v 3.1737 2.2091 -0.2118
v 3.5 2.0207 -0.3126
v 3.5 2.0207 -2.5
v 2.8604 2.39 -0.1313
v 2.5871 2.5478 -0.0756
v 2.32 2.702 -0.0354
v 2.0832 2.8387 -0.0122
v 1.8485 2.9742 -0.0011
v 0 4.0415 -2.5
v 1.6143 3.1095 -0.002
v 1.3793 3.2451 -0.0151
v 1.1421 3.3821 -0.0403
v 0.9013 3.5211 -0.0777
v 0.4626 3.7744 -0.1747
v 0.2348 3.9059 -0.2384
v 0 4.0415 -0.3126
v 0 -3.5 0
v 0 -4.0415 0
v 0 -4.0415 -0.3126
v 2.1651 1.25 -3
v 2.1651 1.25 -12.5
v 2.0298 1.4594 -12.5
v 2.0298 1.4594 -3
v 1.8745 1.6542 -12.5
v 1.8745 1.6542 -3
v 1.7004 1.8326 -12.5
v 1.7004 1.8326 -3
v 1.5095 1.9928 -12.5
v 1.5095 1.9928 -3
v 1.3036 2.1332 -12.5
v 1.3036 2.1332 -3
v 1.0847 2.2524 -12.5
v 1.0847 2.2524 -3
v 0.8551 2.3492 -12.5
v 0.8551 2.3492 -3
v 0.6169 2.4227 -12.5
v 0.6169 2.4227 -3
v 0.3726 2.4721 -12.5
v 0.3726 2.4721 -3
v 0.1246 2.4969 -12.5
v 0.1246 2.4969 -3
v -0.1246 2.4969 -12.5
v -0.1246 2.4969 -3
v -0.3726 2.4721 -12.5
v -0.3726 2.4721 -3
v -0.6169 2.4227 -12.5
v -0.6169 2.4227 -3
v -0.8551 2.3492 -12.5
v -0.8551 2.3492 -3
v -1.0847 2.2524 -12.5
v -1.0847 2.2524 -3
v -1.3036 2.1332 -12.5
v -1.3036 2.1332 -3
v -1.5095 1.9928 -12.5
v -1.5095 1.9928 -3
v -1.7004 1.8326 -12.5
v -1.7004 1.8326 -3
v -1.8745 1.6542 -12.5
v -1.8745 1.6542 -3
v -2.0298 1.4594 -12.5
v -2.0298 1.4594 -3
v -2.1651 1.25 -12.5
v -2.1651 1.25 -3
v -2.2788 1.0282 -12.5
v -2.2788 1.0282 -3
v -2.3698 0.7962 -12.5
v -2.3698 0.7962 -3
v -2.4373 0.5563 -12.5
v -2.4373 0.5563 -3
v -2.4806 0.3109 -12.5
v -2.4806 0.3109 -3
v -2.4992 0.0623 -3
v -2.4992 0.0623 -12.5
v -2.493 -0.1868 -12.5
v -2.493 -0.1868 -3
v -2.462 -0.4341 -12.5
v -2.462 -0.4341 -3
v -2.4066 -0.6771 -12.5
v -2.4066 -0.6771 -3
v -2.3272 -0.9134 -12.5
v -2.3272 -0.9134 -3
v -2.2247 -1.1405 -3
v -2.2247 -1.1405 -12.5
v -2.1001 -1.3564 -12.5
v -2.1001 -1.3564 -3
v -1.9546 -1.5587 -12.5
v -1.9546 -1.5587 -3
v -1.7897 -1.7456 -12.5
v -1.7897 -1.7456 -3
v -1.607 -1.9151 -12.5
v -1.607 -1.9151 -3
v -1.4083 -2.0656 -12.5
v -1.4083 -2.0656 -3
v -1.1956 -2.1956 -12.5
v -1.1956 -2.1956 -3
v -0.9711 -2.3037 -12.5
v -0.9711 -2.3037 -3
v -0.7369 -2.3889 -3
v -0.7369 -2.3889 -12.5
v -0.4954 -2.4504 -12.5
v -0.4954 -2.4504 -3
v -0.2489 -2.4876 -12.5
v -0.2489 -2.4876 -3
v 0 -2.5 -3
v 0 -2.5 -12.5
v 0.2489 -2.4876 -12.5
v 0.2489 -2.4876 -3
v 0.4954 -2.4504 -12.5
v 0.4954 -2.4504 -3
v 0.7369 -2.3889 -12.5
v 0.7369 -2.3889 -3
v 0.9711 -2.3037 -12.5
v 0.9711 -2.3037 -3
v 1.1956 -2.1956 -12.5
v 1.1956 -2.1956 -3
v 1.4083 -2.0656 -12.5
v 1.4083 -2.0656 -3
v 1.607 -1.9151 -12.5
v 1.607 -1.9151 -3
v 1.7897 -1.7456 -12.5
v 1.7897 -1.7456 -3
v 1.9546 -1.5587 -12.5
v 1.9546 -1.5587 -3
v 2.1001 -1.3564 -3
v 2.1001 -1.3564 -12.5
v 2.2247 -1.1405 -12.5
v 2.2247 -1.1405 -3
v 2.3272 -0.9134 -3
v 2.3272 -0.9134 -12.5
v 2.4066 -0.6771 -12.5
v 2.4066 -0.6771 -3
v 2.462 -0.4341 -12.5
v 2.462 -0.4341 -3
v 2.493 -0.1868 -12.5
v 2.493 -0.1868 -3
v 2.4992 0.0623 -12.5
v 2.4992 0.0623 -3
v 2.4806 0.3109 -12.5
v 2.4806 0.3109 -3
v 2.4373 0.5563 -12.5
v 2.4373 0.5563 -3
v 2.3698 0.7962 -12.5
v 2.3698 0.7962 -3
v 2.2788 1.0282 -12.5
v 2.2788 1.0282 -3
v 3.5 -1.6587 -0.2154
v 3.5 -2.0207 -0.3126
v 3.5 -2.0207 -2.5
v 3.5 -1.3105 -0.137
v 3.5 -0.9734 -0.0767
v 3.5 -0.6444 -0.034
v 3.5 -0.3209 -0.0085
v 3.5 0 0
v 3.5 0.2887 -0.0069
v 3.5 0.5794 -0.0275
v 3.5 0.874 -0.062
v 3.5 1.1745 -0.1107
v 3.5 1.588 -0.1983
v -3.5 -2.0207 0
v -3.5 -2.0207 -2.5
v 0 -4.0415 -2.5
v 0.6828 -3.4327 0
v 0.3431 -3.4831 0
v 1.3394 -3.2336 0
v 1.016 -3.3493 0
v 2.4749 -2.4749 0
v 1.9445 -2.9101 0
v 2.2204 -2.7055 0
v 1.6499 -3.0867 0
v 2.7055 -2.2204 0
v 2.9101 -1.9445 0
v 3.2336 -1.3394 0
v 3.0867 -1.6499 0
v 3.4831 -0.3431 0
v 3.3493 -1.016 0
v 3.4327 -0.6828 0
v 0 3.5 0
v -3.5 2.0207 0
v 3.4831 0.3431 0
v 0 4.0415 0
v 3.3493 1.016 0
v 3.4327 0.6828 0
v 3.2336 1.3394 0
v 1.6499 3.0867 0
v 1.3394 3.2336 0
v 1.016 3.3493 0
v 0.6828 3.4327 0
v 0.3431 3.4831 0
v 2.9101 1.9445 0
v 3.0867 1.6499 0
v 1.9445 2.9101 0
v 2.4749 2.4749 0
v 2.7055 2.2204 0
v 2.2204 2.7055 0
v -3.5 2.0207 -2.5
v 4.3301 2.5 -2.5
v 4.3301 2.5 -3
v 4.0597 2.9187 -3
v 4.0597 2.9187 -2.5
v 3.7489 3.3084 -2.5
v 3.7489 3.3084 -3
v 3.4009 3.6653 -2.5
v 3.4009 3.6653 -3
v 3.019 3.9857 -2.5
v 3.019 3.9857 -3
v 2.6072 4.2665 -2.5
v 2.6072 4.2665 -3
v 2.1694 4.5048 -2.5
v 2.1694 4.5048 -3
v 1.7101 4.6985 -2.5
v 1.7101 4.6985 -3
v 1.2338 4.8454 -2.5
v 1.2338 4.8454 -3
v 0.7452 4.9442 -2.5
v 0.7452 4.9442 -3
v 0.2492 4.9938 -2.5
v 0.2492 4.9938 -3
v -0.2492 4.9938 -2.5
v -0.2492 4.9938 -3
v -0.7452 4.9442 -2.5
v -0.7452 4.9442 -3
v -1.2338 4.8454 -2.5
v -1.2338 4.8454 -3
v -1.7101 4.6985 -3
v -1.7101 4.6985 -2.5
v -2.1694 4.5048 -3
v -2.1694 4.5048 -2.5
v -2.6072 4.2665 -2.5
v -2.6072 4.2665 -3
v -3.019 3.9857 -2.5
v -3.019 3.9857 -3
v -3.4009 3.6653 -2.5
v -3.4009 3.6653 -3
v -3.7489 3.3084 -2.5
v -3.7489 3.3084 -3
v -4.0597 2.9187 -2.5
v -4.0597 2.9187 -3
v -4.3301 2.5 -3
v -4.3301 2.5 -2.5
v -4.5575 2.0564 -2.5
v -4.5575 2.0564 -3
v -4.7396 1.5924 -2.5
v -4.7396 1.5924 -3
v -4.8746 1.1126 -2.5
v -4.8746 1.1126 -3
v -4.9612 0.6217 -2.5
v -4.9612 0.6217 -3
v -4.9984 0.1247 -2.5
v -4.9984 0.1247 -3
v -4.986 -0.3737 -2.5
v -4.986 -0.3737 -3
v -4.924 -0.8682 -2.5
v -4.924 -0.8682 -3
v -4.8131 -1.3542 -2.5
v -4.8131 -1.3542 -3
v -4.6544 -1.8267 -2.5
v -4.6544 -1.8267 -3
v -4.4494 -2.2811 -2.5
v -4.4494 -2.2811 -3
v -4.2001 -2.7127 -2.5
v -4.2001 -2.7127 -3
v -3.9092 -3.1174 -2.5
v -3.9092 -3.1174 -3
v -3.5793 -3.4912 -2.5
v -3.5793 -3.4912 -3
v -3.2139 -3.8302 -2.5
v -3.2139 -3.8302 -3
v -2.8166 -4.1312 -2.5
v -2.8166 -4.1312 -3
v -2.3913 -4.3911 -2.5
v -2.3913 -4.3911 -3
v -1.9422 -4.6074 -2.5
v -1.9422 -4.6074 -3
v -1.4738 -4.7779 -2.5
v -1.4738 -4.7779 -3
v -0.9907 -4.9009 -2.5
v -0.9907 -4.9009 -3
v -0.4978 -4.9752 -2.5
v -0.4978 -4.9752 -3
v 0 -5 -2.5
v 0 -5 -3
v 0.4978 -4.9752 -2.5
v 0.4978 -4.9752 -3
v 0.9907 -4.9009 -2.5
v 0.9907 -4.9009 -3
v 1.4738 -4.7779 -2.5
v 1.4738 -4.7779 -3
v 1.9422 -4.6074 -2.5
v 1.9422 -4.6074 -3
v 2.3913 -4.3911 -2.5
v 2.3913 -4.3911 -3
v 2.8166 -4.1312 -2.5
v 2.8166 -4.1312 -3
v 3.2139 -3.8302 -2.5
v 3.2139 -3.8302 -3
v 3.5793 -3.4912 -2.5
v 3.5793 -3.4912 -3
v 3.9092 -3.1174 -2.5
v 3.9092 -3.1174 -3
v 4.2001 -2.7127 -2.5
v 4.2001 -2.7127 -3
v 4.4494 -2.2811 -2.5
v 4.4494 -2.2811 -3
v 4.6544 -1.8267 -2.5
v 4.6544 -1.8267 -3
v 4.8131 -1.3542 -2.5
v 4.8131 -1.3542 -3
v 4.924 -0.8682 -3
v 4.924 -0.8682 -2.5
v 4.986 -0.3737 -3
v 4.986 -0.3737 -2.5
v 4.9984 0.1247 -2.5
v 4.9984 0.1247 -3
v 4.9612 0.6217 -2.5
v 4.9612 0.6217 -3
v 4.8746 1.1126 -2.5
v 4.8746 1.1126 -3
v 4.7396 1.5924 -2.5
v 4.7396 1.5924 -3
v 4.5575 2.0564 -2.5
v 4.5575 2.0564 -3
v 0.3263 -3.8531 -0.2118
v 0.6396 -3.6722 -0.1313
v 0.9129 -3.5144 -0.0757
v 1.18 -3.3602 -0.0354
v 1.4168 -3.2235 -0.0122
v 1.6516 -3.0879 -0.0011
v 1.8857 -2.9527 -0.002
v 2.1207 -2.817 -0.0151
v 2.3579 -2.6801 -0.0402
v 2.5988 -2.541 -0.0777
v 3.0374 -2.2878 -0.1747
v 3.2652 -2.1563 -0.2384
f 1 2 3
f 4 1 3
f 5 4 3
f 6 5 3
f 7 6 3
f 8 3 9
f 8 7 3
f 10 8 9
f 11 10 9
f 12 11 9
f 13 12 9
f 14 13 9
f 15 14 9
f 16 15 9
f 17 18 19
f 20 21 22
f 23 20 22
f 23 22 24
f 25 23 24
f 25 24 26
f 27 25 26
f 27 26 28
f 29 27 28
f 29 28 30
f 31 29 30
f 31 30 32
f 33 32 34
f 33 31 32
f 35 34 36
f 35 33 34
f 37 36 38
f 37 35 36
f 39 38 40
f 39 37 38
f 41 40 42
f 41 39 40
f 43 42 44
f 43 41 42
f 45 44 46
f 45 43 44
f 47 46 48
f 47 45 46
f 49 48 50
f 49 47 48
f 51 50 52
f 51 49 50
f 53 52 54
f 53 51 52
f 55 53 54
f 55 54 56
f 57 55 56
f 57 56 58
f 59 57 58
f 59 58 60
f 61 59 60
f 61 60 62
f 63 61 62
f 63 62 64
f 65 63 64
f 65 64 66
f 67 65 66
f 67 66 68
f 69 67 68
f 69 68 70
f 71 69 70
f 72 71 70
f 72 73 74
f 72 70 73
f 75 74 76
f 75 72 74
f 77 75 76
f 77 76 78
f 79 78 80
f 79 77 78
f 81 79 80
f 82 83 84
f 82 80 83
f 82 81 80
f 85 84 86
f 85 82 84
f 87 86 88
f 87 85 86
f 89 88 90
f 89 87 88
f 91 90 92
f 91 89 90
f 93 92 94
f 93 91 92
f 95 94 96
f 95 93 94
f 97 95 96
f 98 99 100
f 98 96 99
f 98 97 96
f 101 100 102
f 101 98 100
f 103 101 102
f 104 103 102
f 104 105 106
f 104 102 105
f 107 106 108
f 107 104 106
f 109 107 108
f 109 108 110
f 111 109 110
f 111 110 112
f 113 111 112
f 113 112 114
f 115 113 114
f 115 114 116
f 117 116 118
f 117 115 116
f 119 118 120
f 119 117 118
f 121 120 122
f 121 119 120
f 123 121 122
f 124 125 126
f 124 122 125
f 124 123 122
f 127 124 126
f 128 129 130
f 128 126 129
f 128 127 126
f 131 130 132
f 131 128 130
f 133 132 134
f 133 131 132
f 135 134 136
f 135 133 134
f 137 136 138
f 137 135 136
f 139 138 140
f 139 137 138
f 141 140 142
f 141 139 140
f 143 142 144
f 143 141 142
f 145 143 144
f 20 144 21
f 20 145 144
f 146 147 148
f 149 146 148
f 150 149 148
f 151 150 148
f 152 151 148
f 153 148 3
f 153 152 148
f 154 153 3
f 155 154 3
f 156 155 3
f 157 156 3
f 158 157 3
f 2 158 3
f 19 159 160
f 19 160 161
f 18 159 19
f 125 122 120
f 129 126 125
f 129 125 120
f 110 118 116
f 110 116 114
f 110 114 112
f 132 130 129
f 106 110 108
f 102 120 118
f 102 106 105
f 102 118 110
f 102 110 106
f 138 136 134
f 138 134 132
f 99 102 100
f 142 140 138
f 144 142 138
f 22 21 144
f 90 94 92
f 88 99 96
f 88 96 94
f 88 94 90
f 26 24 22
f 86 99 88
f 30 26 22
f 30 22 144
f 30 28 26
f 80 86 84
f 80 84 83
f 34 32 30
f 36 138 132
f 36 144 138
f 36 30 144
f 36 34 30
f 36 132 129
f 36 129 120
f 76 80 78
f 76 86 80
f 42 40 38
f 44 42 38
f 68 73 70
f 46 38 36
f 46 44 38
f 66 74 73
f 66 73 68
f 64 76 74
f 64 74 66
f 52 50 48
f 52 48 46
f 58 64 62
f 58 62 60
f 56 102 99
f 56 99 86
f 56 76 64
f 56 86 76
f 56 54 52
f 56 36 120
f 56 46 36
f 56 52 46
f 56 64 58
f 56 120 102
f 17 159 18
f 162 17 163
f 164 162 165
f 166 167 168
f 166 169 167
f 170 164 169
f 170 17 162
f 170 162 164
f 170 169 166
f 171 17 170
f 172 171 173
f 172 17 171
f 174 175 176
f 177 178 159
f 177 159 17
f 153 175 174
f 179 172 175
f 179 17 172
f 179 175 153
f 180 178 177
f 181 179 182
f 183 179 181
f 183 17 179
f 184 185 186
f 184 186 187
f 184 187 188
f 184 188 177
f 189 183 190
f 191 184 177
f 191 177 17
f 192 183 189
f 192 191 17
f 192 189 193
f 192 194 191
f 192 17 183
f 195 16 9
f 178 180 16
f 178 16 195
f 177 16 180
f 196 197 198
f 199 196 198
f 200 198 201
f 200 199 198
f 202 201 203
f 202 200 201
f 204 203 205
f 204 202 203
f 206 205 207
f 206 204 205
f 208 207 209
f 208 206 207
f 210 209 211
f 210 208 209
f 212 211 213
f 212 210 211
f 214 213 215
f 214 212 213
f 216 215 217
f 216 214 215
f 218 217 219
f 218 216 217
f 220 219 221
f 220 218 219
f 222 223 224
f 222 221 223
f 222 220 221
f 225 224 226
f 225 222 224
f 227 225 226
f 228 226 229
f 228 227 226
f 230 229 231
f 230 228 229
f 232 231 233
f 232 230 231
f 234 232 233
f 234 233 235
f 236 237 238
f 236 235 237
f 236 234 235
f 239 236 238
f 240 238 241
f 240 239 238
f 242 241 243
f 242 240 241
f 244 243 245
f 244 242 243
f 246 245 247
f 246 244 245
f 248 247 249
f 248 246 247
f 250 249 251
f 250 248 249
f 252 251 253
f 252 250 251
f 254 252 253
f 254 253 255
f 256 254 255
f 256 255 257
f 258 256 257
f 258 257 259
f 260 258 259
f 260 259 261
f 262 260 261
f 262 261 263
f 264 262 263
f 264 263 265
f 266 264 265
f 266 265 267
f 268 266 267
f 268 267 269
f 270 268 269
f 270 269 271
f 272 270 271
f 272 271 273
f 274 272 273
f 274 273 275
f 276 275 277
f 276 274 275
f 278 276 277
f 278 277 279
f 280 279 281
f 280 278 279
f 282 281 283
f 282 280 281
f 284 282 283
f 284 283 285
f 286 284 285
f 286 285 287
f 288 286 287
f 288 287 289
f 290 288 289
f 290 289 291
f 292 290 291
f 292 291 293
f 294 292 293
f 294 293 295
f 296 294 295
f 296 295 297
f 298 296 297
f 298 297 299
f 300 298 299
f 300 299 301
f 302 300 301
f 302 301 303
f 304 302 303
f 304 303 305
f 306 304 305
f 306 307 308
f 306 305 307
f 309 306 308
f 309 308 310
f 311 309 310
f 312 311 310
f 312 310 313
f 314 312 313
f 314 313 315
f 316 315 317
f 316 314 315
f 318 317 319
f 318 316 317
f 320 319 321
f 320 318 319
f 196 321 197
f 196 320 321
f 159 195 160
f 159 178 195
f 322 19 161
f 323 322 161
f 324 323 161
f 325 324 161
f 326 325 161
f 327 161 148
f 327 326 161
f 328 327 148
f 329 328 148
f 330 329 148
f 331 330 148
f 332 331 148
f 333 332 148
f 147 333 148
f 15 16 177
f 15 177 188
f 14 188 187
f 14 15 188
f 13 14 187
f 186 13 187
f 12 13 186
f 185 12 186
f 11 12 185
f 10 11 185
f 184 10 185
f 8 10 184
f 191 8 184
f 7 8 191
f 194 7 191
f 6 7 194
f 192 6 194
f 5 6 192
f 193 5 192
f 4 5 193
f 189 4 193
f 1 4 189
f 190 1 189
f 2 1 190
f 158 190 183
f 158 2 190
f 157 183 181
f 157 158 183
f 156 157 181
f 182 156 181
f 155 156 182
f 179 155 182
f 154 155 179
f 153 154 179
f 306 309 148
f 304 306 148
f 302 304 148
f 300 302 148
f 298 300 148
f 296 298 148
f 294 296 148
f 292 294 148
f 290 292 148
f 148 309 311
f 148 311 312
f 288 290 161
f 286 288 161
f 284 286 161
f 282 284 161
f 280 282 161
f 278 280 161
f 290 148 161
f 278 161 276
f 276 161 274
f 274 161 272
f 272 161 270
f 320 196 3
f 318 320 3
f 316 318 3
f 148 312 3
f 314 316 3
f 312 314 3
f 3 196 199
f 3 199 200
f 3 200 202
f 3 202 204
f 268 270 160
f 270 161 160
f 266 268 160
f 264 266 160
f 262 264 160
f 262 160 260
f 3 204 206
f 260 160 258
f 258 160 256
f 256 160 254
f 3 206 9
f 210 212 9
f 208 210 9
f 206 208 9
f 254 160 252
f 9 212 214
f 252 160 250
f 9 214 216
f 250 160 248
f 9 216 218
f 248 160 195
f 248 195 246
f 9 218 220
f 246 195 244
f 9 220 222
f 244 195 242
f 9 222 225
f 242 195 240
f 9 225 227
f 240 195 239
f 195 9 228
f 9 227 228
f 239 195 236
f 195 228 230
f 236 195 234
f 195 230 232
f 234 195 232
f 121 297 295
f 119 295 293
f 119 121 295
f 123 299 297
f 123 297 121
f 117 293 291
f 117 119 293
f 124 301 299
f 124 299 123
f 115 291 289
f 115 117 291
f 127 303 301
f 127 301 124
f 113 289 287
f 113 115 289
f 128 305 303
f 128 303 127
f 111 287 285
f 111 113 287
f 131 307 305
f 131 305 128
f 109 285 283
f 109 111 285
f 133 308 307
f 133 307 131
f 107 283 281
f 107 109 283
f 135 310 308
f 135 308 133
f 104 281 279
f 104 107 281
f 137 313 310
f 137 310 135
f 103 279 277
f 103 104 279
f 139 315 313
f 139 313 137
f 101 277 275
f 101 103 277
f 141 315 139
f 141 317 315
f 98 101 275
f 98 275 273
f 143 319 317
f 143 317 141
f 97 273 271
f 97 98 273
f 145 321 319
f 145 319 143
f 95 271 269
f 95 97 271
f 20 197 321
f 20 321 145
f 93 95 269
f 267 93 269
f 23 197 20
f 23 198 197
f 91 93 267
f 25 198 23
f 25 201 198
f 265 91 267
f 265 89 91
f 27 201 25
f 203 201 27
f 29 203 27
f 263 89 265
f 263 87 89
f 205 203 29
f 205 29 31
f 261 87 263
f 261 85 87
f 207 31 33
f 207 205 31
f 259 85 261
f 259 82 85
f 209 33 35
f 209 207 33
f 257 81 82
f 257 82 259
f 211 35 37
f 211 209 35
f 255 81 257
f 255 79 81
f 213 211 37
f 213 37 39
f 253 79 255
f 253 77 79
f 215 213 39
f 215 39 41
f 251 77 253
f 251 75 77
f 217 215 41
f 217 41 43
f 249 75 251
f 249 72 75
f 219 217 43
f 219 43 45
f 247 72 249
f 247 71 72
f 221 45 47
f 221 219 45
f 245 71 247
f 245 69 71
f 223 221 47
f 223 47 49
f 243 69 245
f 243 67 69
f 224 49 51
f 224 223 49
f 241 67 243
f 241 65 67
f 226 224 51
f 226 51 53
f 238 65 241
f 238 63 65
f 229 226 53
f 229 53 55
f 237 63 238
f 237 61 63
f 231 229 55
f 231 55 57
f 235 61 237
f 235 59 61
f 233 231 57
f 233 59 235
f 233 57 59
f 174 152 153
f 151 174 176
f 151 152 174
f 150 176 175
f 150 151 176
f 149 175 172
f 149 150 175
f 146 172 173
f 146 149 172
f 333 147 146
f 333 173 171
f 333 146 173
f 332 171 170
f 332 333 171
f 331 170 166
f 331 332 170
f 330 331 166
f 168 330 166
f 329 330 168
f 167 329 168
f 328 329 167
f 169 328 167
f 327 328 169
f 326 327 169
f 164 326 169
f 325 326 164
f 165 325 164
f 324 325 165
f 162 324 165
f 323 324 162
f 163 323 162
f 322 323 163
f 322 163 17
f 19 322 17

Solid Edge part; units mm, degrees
sketch "Sketch1" plane through (0, 0, 0) normal (0, 0, 1) x (1, 0, 0)
  line L0 (0, -4.0415) -> (3.5, -2.0207)
  line L1 (3.5, -2.0207) -> (3.5, 2.0207)
  line L2 (3.5, 2.0207) -> (0, 4.0415)
  line L3 (0, 4.0415) -> (-3.5, 2.0207)
  line L4 (-3.5, 2.0207) -> (-3.5, -2.0207)
  line L5 (-3.5, -2.0207) -> (0, -4.0415)
extrude "Protrusion1" add sketch "Sketch1" against normal blind 2.5
sketch "Sketch2" plane through (0, 0, -2.5) normal (0, 0, -1) x (0.866, 0.5, 0)
  circle A0 centre (0, 0) radius 5
extrude "ExtrudedProtrusion_2" add sketch "Sketch2" along normal blind 0.5
sketch "Sketch3" plane through (0, 0, -2.5) normal (0, 0, -1) x (0.866, 0.5, 0)
  circle A0 centre (0, 0) radius 2.5
extrude "ExtrudedProtrusion_3" add sketch "Sketch3" along normal blind 10
sketch "Sketch4" plane through (0, 0, 0) normal (0, -1, 0) x (1, 0, 0)
  line L0 (6.9641, 0) -> (3.5, 0)
  line L1 (3.5, 0) -> (6.9641, -2)
  line L2 (6.9641, -2) -> (6.9641, 0)
revolve "RevolvedCutout1" cut sketch "Sketch4" angle 90 about axis through (0, 0, 0) along (0, 0, -1)
sketch "Sketch5" plane through (0, 0, 0) normal (0, -1, 0) x (1, 0, 0)
  line L0 (3.1642, 0.1939) -> (4.2543, 0.1939)
  line L1 (4.2543, 0.1939) -> (4.2543, -0.4355)
  line L2 (4.2543, -0.4355) -> (3.5, 0)
  line L3 (3.5, 0) -> (3.1642, 0.1939)
revolve "RevolvedCutout_6" cut sketch "Sketch5" angle 90 about axis through (0, 0, 0) along (0, 0, 1)
